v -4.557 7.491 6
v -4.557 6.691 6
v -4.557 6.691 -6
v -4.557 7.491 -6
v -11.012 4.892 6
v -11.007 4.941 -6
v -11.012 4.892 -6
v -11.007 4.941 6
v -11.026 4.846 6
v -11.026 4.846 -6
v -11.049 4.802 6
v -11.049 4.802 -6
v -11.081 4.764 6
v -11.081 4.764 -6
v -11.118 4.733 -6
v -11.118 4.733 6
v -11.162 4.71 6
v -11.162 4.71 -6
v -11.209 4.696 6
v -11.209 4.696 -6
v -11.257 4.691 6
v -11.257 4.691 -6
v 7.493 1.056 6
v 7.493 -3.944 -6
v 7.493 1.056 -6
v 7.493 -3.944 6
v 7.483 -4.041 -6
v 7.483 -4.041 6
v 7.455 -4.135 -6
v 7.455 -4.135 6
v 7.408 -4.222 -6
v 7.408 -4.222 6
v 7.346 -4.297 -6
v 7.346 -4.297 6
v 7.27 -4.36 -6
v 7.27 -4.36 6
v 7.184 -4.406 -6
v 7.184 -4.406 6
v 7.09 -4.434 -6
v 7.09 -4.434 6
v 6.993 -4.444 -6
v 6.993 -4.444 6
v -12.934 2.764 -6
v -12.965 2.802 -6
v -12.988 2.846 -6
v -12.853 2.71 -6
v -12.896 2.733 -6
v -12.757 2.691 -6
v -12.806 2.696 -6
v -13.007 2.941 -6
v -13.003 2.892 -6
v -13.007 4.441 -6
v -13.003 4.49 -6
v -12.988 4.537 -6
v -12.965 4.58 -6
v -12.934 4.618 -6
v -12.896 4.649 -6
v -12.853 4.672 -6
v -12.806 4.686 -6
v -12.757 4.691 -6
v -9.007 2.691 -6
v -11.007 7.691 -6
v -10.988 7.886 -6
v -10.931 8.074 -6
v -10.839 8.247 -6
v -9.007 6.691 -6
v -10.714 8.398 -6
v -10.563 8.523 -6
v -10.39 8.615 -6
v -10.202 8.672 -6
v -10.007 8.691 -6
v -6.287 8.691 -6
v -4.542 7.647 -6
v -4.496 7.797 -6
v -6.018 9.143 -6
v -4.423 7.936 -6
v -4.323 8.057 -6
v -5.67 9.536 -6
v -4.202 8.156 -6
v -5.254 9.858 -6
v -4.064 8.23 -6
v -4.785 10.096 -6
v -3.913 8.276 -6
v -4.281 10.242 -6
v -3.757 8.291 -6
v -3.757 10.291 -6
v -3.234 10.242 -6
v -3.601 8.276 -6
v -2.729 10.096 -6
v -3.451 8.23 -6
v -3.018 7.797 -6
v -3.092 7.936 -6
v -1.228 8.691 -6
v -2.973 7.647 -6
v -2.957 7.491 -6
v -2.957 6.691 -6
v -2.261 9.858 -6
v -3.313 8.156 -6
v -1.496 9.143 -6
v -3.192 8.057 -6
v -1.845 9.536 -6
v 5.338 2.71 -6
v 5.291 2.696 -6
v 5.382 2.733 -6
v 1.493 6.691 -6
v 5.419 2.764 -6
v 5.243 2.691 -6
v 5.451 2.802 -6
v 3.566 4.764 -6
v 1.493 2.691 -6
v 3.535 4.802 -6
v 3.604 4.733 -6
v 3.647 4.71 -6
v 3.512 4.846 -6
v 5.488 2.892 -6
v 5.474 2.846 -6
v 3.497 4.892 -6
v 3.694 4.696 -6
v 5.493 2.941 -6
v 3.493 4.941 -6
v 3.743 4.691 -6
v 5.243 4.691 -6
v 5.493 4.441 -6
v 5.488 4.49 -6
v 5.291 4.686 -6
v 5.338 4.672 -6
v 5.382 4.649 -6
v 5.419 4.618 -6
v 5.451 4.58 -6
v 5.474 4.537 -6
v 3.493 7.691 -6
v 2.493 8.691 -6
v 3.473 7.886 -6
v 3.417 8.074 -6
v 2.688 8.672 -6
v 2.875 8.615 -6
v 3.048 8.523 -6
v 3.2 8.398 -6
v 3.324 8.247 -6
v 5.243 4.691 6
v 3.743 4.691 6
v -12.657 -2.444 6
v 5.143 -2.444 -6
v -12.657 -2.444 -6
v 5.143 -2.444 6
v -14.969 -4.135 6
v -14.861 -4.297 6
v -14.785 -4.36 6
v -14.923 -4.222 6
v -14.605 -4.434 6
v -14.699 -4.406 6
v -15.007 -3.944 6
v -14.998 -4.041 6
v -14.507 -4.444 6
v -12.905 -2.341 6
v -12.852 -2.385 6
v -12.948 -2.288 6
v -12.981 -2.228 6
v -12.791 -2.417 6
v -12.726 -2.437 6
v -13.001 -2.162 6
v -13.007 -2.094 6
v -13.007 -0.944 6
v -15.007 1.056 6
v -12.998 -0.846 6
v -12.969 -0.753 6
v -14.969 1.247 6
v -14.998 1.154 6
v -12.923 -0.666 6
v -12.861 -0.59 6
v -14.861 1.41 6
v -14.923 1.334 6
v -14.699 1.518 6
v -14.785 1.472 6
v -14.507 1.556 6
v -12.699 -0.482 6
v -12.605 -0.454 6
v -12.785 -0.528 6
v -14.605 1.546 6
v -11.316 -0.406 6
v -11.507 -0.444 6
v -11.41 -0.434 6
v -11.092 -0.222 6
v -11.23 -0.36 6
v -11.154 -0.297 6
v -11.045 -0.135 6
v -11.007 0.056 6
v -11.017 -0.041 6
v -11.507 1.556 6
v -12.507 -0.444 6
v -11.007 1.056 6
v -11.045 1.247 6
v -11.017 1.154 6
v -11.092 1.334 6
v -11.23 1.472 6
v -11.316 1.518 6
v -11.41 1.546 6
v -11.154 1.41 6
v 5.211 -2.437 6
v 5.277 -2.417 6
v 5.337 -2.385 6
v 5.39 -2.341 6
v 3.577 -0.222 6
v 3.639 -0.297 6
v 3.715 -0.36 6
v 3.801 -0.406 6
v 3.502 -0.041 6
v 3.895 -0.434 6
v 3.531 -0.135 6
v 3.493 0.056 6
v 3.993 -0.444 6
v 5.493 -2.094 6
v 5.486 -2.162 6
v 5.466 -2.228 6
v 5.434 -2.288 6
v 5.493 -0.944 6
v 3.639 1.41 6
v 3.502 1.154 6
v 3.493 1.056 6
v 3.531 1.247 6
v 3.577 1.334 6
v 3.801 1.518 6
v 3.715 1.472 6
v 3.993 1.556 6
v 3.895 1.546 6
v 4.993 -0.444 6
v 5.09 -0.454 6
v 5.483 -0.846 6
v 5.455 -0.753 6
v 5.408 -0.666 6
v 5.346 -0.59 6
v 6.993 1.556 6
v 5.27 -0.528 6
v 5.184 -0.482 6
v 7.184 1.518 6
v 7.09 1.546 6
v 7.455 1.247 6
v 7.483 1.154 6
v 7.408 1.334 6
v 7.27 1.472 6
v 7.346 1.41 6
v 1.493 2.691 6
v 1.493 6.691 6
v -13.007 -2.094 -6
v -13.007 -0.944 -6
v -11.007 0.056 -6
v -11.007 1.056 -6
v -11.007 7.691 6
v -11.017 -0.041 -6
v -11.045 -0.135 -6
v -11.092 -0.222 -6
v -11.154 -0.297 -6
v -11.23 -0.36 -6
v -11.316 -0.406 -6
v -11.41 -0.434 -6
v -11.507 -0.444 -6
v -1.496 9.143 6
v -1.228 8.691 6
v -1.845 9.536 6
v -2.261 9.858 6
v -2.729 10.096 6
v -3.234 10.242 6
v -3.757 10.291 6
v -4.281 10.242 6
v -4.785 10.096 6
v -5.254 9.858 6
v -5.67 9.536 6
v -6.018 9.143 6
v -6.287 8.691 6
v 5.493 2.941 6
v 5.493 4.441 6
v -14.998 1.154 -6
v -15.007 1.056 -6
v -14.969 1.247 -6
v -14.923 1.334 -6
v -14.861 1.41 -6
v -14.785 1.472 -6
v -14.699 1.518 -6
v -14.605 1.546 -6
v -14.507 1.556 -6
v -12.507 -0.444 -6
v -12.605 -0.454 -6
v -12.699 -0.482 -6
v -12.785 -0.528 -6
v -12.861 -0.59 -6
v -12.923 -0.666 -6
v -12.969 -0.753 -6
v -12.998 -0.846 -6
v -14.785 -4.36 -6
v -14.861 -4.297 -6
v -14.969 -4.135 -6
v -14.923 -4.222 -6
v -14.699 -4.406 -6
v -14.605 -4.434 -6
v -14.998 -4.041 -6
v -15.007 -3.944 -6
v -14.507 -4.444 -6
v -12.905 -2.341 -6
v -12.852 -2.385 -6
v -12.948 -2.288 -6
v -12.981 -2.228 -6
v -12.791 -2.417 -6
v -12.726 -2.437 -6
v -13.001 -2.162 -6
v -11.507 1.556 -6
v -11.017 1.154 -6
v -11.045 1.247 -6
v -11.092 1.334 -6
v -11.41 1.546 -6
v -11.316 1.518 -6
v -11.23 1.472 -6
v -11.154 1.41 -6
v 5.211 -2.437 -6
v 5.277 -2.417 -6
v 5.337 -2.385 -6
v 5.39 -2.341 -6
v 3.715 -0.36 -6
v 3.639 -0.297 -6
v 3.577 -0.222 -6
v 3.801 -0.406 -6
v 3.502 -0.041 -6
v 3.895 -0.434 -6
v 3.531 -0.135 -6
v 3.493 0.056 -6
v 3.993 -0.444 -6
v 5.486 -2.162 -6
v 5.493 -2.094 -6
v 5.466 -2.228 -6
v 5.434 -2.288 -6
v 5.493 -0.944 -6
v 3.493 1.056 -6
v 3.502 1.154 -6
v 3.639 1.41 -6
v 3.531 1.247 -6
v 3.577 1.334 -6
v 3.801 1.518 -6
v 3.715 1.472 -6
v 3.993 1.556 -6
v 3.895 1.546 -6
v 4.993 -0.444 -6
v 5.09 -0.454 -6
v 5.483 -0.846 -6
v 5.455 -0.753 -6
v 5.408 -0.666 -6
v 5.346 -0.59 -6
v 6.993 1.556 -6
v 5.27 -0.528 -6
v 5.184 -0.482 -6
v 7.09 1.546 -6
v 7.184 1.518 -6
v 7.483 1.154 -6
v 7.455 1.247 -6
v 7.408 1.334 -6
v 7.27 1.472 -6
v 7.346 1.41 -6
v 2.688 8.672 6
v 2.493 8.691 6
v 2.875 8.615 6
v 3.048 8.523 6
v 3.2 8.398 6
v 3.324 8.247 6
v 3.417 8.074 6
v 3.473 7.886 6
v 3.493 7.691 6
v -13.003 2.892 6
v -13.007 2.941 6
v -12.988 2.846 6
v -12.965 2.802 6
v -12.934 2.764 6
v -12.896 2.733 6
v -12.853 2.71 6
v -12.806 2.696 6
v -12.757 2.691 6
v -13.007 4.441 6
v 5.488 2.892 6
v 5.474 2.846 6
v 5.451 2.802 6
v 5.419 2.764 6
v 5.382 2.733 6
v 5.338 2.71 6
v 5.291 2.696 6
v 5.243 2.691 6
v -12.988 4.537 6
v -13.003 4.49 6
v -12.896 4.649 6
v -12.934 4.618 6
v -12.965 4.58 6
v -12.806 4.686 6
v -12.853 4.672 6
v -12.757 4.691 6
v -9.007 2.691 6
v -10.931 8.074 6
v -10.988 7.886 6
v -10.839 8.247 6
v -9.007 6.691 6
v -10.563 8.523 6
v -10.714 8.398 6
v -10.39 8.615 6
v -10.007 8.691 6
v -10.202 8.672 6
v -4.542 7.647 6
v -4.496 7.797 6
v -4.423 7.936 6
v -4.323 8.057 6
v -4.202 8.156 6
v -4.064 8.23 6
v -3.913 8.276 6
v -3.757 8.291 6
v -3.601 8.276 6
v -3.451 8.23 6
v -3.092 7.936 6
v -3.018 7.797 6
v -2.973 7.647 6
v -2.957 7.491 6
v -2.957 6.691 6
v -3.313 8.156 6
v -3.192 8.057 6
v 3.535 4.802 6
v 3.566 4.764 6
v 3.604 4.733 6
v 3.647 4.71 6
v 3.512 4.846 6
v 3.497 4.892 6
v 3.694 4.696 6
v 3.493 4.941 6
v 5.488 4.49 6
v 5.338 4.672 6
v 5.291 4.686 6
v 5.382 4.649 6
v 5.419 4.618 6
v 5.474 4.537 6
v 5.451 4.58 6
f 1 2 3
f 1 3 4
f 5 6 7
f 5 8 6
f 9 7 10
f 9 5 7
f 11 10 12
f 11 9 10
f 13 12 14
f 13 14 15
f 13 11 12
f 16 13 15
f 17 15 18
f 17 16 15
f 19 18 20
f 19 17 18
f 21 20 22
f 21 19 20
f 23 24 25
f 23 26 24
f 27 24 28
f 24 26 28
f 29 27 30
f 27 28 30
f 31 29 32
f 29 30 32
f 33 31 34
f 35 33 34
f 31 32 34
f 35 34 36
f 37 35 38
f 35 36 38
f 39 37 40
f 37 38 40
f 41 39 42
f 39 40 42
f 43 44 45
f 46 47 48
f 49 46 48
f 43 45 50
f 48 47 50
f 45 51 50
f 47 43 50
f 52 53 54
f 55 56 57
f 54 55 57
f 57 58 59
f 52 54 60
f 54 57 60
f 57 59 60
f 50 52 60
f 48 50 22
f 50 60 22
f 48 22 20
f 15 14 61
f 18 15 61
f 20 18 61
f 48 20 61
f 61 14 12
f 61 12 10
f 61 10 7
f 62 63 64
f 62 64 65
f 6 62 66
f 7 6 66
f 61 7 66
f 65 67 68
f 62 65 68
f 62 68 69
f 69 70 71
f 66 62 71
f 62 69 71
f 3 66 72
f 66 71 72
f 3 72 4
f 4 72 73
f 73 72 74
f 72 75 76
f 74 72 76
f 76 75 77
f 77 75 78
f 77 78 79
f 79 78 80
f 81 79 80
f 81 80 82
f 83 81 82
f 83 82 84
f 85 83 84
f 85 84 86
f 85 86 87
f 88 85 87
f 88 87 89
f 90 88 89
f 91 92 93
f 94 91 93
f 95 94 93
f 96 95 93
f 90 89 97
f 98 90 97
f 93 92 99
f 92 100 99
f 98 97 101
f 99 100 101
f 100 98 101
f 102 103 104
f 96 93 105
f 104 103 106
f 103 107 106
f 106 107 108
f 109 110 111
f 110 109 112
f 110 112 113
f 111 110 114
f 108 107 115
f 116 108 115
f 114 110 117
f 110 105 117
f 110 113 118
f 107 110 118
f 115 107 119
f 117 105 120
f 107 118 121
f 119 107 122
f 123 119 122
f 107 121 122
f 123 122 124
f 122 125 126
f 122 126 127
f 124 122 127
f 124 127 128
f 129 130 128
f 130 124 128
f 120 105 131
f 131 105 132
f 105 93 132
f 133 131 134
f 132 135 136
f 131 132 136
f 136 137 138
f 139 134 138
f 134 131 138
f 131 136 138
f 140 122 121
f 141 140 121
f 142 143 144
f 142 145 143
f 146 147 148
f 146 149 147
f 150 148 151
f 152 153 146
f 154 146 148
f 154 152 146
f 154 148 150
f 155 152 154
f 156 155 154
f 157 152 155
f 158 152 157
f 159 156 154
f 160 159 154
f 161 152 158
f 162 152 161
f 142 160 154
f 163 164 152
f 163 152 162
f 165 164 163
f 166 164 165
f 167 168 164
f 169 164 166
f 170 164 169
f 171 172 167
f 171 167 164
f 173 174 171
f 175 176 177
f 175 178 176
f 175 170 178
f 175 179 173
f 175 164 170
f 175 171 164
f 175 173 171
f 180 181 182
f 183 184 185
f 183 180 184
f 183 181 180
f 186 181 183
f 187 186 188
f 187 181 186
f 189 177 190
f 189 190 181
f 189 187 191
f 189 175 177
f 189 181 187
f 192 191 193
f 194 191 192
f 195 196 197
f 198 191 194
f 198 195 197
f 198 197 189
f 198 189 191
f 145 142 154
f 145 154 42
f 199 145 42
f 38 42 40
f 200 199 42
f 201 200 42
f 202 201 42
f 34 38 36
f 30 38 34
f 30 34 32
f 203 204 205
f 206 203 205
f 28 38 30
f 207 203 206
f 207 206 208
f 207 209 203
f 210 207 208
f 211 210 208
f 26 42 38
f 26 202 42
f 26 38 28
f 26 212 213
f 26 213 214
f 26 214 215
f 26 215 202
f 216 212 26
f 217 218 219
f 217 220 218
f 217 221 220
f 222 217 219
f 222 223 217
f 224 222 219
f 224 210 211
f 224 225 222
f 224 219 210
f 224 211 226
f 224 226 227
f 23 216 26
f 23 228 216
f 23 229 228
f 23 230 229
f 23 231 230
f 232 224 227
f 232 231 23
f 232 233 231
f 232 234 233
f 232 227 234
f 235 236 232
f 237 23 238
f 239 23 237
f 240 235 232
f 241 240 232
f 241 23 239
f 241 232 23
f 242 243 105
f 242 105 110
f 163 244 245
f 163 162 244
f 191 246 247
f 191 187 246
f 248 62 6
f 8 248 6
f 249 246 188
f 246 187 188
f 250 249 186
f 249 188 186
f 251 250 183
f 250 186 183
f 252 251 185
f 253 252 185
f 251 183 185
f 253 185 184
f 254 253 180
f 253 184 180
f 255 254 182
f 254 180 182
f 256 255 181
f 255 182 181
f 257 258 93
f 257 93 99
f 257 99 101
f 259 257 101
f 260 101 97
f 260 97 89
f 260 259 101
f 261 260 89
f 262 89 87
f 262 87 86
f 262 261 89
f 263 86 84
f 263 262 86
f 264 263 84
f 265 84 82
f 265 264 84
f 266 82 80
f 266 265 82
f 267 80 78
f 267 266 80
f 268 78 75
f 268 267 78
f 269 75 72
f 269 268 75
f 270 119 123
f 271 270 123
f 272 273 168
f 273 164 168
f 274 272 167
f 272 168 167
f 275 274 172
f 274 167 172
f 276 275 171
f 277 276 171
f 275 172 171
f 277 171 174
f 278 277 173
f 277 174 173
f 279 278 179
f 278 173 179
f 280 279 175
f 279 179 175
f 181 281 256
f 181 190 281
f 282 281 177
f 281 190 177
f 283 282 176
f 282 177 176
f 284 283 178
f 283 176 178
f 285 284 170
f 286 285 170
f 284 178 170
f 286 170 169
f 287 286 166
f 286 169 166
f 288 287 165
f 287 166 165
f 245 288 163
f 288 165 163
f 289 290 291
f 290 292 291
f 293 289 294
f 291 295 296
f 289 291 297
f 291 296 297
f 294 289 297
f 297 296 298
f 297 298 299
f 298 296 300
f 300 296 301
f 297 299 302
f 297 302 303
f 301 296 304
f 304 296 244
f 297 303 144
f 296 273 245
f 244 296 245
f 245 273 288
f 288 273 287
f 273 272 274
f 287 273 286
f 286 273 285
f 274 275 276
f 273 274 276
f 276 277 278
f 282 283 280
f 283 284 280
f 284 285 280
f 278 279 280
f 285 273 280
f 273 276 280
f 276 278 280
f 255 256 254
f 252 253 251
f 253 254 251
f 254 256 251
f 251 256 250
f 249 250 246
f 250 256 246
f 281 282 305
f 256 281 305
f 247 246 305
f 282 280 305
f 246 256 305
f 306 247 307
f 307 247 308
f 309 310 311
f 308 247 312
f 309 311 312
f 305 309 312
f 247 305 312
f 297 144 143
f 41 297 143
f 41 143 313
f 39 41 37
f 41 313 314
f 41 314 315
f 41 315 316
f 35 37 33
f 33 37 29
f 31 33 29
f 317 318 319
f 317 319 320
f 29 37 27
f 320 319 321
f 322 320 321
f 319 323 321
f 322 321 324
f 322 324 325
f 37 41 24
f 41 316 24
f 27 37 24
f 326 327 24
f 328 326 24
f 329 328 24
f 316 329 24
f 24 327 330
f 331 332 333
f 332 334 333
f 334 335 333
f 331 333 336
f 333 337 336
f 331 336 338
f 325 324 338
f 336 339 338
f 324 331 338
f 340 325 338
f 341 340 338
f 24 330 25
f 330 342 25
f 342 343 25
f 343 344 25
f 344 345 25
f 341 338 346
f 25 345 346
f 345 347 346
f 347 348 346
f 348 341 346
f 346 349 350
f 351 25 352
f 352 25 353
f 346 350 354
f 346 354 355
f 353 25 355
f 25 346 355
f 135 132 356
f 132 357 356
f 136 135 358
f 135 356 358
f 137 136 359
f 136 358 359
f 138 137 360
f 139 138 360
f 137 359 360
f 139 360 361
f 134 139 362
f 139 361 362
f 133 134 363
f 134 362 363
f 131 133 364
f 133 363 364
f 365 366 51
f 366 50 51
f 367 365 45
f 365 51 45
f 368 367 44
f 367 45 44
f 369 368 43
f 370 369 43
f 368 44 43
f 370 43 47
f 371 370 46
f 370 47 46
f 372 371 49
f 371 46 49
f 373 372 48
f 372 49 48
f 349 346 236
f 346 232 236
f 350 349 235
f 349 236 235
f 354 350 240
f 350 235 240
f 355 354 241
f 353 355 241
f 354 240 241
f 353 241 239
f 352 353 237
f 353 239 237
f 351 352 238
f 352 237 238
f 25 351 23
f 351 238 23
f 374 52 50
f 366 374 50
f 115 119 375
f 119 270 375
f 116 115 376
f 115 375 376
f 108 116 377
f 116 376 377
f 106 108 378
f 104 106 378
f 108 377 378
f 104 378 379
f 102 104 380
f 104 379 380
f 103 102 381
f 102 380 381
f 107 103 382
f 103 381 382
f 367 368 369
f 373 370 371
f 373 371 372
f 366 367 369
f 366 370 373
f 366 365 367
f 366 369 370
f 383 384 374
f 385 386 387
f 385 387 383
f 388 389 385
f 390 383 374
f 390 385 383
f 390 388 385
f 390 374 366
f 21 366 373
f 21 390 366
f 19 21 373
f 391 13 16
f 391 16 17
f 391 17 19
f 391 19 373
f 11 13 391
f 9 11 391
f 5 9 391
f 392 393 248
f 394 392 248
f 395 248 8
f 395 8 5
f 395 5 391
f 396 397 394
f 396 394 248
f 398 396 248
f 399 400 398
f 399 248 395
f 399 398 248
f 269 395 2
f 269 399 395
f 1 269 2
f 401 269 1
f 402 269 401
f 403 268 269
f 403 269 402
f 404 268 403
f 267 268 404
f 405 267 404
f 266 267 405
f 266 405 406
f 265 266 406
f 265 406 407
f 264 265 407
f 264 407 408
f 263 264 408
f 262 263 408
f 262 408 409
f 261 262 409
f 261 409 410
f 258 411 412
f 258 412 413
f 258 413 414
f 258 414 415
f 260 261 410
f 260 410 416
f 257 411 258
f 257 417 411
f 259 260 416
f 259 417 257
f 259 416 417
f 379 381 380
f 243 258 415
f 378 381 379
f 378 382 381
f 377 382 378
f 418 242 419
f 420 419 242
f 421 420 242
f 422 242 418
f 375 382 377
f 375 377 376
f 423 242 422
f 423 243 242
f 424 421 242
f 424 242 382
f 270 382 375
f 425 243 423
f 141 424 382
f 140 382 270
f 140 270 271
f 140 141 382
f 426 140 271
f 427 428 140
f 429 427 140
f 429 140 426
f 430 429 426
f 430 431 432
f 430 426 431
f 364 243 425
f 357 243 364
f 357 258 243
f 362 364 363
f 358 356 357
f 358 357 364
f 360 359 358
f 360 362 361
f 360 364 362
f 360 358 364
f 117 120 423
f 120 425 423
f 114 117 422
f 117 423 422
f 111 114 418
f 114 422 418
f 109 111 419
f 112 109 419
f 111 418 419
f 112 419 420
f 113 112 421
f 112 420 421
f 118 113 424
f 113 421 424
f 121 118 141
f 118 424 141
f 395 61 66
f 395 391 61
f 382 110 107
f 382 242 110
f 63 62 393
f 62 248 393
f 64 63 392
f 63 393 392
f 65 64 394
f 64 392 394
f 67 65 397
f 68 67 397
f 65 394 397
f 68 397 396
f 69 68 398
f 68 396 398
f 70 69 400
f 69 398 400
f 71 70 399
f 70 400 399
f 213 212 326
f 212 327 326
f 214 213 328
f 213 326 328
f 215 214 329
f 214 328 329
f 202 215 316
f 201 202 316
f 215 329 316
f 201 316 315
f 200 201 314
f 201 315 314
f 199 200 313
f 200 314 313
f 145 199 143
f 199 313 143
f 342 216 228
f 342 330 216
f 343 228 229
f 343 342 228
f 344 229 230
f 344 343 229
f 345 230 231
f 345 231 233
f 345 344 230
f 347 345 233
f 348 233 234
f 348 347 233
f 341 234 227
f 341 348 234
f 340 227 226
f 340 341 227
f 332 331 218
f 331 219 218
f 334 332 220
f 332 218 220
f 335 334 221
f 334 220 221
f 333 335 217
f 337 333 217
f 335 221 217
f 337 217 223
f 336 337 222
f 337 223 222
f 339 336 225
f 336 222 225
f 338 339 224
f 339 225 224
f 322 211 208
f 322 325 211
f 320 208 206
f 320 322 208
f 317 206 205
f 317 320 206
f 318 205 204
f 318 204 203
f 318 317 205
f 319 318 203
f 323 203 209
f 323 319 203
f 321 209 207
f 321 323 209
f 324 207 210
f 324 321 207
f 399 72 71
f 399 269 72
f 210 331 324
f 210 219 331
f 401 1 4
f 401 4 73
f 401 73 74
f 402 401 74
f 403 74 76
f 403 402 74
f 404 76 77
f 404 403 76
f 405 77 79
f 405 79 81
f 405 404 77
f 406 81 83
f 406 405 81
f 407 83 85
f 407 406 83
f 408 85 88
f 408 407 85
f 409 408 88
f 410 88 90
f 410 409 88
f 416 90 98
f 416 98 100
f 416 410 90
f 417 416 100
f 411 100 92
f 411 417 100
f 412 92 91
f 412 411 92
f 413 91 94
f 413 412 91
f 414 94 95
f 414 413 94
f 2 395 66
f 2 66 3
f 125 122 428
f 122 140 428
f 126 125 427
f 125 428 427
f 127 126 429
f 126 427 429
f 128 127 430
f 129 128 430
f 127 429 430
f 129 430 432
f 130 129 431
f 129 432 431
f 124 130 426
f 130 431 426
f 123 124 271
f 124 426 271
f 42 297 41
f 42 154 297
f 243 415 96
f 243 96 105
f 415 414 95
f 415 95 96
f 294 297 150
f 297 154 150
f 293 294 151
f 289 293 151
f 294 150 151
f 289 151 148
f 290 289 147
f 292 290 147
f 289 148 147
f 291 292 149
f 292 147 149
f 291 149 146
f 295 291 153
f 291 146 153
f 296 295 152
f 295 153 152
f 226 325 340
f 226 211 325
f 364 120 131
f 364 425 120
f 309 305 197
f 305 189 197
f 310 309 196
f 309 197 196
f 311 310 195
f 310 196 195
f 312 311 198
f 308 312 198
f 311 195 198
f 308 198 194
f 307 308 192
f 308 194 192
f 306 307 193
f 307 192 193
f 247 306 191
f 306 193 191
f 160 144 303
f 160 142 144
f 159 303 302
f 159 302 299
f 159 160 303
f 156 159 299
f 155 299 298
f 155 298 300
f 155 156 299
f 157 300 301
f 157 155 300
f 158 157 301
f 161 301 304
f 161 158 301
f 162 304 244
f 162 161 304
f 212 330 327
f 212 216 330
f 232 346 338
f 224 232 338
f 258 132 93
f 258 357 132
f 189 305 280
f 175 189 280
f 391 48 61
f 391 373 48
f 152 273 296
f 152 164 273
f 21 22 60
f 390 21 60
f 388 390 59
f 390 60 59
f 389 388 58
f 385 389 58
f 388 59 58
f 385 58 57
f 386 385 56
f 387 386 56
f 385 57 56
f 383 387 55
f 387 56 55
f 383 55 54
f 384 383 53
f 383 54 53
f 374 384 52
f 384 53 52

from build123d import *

# Parameters (mm, degrees)
F1_DEPTH = 6
F2_R     = 1
F3_R     = 0.25
F4_R     = 0.5
F5_R     = 0.35


# Not quite as in the source:
# - a feature names something its author has since deleted; it is built from what else it names


with BuildPart() as f1:
    # F0 (on Top) → F1 (new body, symmetric)
    with BuildSketch(Plane.XY):
        with BuildLine():
            Line((-9.0073623574, 2.6911826732), (-9.0073623574, 6.6911826732))
            Line((-9.0073623574, 6.6911826732), (-4.5573623574, 6.6911826732))
            Line((-4.5573623574, 6.6911826732), (-4.5573623574, 7.4911826732))
            ThreePointArc((-4.5573623574, 7.4911826732), (-4.3230477824, 8.0568680982), (-3.7573623574, 8.2911826732))
            ThreePointArc((-3.7573623574, 8.2911826732), (-3.1916769325, 8.0568680982), (-2.9573623574, 7.4911826732))
            Line((-2.9573623574, 7.4911826732), (-2.9573623574, 6.6911826732))
            Line((-2.9573623574, 6.6911826732), (1.4926376426, 6.6911826732))
            Line((1.4926376426, 6.6911826732), (1.4926376426, 2.6911826732))
            Line((1.4926376426, 2.6911826732), (3.4926376426, 2.6911826732))
            Line((3.4926376426, 2.6911826732), (5.4926376426, 2.6911826732))
            Line((5.4926376426, 2.6911826732), (5.4926376426, 4.6911826732))
            Line((5.4926376426, 4.6911826732), (3.4926376426, 4.6911826732))
            Line((3.4926376426, 4.6911826732), (3.4926376426, 8.6911826732))
            Line((3.4926376426, 8.6911826732), (-1.2275402293, 8.6911826732))
            ThreePointArc((-1.2275402293, 8.6911826732), (-2.2606994027, 9.8576145865), (-3.7573623574, 10.2911826732))
            ThreePointArc((-3.7573623574, 10.2911826732), (-5.2540253122, 9.8576145865), (-6.2871844856, 8.6911826732))
            Line((-6.2871844856, 8.6911826732), (-11.0073623574, 8.6911826732))
            Line((-11.0073623574, 8.6911826732), (-11.0073623574, 4.6911826732))
            Line((-11.0073623574, 4.6911826732), (-13.0073623574, 4.6911826732))
            Line((-13.0073623574, 4.6911826732), (-13.0073623574, 2.6911826732))
            Line((-13.0073623574, 2.6911826732), (-11.0073623574, 2.6911826732))
            Line((-11.0073623574, 2.6911826732), (-9.0073623574, 2.6911826732))
        make_face()
    extrude(amount=F1_DEPTH, both=True)

    # F2
    f2_edges = [f1.edges().sort_by_distance(p)[0] for p in [
        (-11.007362, 8.691183, 0),
        (3.492638, 8.691183, 0),
    ]]
    fillet(f2_edges, radius=F2_R)

    # F3
    f3_edges = [f1.edges().sort_by_distance(p)[0] for p in [
        (-11.007362, 4.691183, 0),
        (-13.007362, 4.691183, 0),
        (-13.007362, 2.691183, 0),
        (3.492638, 4.691183, 0),
        (5.492638, 4.691183, 0),
        (5.492638, 2.691183, 0),
    ]]
    fillet(f3_edges, radius=F3_R)


with BuildPart() as f1b:
    # F0 (on Top) → F1, piece 2 (new body, symmetric)
    with BuildSketch(Plane.XY):
        Polygon((5.4926376426, -2.4439409186), (-3.7573623574, -2.4439409186), (-13.0073623574, -2.4439409186), (-13.0073623574, -0.4439409186), (-11.0073623574, -0.4439409186), (-11.0073623574, 1.5560590814), (-15.0073623574, 1.5560590814), (-15.0073623574, -4.4439409186), (-3.7573623574, -4.4439409186), (7.4926376426, -4.4439409186), (7.4926376426, 1.5560590814), (3.4926376426, 1.5560590814), (3.4926376426, -0.4439409186), (5.4926376426, -0.4439409186), align=None)
    extrude(amount=F1_DEPTH, both=True)

    # F4
    f4_edges = [f1b.edges().sort_by_distance(p)[0] for p in [
        (3.492638, -0.443941, 0),
        (5.492638, -0.443941, 0),
        (-11.007362, 1.556059, 0),
        (3.492638, 1.556059, 0),
        (-15.007362, 1.556059, 0),
        (7.492638, 1.556059, 0),
        (-15.007362, -4.443941, 0),
        (7.492638, -4.443941, 0),
        (-11.007362, -0.443941, 0),
        (-13.007362, -0.443941, 0),
    ]]
    fillet(f4_edges, radius=F4_R)

    # F5
    f5_edges = [f1b.edges().sort_by_distance(p)[0] for p in [
        (-13.007362, -2.443941, 0),
        (5.492638, -2.443941, 0),
    ]]
    fillet(f5_edges, radius=F5_R)


solid = Compound([f1.part, f1b.part])
